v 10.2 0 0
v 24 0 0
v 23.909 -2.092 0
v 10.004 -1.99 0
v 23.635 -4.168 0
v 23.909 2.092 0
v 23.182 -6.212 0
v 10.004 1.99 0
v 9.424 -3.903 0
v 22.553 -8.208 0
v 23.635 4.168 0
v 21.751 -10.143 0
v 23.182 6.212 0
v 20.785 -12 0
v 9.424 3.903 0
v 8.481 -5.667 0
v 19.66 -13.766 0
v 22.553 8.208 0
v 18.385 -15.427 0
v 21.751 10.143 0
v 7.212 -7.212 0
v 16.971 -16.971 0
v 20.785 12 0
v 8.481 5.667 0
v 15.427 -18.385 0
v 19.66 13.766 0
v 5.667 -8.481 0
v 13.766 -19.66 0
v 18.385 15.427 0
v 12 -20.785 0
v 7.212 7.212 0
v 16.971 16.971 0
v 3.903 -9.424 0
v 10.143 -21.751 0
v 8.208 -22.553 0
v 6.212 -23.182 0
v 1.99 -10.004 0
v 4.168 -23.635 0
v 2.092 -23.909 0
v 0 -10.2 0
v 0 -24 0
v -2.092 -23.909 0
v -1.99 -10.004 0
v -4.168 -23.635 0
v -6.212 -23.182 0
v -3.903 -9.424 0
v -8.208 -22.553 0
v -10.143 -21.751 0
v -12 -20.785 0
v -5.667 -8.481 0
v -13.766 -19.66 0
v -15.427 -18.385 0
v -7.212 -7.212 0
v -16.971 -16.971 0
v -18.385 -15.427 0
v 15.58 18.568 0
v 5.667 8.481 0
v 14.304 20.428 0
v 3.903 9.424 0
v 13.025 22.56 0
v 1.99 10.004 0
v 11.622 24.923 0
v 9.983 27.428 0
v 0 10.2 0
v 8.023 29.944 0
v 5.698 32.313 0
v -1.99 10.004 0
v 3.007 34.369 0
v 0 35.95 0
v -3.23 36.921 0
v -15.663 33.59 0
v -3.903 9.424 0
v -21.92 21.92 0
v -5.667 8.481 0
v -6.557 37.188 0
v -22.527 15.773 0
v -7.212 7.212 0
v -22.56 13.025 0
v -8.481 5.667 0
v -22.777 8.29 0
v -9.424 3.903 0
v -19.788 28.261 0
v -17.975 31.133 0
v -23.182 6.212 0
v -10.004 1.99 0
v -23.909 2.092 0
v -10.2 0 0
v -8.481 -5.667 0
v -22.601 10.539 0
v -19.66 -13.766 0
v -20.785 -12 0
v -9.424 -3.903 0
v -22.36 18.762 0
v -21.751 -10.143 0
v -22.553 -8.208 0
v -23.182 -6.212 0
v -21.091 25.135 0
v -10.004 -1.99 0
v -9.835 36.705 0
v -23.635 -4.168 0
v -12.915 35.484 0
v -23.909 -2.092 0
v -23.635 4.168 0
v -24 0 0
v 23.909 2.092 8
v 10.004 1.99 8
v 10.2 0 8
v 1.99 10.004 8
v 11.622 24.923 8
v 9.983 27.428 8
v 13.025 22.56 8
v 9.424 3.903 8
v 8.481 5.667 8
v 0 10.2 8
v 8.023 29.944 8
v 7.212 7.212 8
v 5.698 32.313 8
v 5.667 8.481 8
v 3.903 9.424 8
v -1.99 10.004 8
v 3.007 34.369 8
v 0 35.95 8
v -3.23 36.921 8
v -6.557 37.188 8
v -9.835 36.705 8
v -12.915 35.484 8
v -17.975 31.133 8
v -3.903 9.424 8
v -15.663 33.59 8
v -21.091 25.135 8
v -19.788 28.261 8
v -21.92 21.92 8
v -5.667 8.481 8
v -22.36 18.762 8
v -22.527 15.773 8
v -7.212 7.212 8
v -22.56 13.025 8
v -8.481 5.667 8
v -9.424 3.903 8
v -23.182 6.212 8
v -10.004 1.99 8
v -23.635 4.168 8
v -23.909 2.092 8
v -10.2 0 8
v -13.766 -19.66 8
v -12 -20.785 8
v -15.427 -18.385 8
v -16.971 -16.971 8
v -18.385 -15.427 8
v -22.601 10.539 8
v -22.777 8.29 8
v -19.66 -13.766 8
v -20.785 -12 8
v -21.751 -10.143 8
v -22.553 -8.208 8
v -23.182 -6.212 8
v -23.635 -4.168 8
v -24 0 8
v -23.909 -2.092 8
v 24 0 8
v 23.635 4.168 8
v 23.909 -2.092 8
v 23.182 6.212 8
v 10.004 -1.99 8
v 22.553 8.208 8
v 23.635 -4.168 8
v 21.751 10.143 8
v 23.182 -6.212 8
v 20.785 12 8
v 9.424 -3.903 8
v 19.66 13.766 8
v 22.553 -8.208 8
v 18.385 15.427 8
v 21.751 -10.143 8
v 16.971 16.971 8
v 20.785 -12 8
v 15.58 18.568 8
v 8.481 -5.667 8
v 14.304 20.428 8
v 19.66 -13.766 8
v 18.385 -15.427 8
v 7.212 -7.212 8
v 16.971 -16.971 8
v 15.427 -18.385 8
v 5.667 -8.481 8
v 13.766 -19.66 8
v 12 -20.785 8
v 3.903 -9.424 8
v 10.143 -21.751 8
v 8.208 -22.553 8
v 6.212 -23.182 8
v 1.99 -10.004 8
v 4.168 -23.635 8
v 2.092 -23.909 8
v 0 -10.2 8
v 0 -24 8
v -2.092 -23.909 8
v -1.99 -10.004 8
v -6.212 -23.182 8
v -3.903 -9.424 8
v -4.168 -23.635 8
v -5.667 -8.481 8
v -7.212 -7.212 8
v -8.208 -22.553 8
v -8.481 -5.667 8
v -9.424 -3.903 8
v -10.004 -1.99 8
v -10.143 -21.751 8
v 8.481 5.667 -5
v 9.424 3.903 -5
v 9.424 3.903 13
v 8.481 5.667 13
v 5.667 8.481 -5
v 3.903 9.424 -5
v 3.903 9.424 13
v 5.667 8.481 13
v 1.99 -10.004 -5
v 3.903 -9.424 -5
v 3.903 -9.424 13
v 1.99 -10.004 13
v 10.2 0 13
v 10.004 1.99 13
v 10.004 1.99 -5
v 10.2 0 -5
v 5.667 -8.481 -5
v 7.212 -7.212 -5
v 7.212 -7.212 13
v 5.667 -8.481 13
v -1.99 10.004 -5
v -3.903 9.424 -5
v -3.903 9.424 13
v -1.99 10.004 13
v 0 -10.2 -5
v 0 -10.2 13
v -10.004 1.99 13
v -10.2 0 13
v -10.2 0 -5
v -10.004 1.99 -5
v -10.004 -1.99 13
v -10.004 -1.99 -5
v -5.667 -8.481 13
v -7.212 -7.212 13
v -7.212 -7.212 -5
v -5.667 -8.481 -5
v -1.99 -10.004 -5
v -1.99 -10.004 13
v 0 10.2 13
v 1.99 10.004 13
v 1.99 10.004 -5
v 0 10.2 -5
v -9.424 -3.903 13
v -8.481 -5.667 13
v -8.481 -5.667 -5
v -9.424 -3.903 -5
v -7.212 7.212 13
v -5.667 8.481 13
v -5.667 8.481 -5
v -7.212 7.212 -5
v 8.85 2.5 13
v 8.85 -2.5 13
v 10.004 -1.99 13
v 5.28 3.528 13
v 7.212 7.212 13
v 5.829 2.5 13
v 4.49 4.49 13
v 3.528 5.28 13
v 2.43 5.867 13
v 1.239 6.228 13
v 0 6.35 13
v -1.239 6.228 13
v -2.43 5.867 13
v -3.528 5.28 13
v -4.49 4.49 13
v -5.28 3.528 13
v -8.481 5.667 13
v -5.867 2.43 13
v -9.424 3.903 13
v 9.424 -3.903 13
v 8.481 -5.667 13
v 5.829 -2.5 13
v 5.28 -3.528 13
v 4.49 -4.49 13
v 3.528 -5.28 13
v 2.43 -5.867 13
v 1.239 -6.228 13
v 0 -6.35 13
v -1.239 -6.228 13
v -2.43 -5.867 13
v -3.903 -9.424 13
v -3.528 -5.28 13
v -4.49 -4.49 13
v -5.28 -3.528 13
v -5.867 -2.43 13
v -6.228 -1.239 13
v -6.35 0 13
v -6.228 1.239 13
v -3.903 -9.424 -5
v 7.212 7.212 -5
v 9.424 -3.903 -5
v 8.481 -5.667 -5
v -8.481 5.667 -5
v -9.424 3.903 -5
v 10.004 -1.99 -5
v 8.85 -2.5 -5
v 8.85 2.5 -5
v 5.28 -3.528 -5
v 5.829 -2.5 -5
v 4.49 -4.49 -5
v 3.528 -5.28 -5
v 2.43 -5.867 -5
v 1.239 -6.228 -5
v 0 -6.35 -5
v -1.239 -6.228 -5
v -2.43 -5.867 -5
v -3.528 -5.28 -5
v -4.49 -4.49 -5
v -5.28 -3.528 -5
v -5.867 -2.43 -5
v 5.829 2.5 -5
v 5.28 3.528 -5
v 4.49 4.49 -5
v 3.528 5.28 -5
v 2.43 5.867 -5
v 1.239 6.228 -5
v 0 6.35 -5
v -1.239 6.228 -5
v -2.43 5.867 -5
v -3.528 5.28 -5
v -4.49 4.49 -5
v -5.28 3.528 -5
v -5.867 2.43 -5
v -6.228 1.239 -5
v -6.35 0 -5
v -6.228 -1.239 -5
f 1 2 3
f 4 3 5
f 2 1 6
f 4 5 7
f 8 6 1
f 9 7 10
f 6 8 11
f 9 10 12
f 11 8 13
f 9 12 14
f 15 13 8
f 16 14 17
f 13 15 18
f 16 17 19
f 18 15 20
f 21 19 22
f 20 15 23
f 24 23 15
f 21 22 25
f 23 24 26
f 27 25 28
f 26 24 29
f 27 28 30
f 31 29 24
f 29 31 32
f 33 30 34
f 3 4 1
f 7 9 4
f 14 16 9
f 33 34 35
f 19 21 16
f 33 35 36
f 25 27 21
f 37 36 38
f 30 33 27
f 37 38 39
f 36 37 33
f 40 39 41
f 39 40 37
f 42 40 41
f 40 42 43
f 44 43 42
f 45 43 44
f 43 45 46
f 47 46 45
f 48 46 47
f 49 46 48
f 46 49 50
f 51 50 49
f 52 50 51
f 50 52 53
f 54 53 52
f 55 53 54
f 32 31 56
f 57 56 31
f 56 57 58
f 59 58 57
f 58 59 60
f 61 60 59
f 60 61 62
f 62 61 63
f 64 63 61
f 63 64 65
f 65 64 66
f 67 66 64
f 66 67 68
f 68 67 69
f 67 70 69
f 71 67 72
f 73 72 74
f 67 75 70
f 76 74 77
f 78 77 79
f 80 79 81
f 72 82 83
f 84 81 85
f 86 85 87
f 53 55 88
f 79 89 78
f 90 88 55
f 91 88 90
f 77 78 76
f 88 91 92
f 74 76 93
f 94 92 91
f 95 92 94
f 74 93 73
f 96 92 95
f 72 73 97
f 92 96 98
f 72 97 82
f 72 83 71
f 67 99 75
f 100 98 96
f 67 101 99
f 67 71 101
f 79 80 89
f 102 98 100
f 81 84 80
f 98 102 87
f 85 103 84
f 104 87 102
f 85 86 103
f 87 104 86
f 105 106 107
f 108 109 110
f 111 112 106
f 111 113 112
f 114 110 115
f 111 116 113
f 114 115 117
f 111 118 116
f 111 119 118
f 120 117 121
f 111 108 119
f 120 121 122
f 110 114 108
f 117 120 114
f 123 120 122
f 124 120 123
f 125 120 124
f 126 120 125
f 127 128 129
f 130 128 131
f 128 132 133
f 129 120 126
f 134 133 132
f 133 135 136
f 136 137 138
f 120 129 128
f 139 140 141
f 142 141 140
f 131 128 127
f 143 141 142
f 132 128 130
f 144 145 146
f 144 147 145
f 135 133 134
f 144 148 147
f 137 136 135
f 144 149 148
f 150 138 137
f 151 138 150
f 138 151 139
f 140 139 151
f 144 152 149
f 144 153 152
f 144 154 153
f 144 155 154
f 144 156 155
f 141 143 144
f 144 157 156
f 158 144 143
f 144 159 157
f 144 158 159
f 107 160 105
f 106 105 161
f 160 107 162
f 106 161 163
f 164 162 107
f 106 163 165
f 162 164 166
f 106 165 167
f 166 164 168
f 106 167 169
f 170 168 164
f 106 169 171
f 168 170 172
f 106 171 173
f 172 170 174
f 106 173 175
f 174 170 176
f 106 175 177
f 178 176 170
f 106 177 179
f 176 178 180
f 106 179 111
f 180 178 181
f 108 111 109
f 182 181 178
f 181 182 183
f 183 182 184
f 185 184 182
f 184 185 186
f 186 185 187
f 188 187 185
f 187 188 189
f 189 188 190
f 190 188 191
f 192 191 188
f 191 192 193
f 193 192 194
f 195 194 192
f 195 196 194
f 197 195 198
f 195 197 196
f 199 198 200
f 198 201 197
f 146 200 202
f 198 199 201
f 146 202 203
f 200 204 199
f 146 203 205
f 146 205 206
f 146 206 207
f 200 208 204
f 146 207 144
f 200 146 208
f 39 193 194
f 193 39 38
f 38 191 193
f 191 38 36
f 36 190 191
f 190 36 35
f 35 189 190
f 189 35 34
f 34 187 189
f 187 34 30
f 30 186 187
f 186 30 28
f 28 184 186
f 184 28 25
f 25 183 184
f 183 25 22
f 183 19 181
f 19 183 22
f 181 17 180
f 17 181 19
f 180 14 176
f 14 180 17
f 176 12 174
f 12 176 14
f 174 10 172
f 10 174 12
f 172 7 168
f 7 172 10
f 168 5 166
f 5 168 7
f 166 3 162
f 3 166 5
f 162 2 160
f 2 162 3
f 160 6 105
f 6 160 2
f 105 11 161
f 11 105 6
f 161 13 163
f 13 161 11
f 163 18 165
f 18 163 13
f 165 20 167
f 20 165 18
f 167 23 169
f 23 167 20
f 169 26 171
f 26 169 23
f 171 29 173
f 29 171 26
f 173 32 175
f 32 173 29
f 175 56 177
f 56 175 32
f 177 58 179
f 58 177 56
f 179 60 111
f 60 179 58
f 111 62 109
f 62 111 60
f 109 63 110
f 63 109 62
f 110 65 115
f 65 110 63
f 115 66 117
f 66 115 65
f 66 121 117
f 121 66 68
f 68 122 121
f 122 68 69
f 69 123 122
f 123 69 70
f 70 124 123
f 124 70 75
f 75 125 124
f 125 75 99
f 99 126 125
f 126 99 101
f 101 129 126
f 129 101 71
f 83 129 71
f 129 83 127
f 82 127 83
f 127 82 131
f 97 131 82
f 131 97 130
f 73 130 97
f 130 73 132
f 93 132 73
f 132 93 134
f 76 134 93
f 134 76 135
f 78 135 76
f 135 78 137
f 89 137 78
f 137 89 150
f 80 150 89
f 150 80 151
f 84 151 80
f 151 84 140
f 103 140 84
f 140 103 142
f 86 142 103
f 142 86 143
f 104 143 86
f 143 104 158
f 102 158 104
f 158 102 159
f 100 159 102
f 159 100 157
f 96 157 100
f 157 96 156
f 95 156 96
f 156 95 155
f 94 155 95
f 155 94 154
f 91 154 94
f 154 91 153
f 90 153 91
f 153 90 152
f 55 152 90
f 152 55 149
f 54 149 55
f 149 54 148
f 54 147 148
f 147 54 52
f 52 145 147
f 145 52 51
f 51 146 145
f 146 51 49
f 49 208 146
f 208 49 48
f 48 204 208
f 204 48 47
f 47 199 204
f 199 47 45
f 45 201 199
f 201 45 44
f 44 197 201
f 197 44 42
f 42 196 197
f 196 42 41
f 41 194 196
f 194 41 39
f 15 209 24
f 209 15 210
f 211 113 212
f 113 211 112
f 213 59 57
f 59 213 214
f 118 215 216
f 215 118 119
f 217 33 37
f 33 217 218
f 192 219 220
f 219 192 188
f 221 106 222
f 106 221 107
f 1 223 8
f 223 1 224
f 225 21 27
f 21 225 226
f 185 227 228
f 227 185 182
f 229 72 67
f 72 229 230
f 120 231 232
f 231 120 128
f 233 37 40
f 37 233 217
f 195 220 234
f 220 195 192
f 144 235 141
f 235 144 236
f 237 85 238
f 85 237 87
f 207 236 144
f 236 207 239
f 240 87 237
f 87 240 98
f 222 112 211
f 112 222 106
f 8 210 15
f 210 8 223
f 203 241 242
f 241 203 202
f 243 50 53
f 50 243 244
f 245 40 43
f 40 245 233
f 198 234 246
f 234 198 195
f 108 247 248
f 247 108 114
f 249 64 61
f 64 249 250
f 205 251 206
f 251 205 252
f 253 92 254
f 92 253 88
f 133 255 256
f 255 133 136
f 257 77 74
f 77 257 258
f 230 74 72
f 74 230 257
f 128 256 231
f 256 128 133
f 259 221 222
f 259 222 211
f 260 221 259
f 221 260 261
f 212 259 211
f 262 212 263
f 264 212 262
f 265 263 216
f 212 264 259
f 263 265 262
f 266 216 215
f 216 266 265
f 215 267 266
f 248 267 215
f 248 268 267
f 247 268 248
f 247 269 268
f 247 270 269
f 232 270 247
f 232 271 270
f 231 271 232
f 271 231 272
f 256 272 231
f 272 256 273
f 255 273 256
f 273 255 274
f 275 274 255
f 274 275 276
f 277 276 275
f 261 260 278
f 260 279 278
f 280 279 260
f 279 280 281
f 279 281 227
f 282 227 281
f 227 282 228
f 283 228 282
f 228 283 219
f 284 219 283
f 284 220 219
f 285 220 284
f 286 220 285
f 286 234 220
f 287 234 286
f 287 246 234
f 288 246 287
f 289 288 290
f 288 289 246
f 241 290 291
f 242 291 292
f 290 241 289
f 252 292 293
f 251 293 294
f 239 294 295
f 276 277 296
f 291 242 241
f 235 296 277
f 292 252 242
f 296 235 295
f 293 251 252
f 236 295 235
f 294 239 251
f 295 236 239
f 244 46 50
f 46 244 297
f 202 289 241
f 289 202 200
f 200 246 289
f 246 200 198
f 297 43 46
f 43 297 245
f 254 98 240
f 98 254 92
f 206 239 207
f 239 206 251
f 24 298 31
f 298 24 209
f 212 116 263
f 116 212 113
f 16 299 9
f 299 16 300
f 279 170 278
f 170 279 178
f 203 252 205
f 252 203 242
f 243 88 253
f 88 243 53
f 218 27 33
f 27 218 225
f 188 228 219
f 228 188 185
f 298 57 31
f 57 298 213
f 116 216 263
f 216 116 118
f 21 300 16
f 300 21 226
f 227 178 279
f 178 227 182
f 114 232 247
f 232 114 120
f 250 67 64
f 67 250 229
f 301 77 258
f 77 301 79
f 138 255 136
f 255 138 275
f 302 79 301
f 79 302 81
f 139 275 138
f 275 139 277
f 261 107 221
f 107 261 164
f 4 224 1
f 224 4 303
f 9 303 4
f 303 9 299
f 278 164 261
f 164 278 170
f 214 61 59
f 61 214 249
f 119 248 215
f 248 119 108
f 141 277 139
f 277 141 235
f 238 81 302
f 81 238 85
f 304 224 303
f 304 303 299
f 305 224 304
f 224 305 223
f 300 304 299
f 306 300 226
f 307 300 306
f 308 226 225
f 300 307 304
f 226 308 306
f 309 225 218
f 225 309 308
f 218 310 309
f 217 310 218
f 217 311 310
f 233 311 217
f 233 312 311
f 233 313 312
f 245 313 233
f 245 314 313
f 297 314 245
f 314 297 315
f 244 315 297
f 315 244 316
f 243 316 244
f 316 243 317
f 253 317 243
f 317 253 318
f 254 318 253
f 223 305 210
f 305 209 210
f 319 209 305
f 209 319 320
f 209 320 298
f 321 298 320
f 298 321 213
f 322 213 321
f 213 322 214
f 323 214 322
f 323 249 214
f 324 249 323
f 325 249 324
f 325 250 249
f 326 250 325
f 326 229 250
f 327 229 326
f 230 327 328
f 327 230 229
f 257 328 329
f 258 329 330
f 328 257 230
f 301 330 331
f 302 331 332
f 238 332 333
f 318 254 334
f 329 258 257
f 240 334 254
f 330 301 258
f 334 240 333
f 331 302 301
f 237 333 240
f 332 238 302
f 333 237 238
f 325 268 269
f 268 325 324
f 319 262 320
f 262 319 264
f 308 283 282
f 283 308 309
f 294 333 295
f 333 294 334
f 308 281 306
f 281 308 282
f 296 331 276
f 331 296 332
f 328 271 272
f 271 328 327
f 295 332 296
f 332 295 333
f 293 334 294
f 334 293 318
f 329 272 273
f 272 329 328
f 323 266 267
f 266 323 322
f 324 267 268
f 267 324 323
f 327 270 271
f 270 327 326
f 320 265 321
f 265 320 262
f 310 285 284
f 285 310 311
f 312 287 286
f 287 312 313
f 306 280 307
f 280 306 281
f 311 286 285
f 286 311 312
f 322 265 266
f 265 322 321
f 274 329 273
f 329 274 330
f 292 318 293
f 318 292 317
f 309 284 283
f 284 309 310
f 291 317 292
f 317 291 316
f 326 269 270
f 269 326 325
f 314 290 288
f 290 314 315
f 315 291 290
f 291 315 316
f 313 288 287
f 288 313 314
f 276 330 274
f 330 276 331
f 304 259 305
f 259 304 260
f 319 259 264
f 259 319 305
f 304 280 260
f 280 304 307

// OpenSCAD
$fn = 32;

// ----------------------------------------------------------------------
// Cam: base radius 24 mm with a 14 mm lift over 120 degrees
// ----------------------------------------------------------------------

// --- parameters (mm) ---
base_r = 24;              // base radius
lift = 14;                // lift height above the base radius
lift_span = 120;          // angular width of the lift
lift_start = 45;          // angle where the lift starts
cam_t = 8;                // cam plate thickness
hub_d = 20.4;             // hub diameter
hub_h = 18;               // hub height
bore_d = 12.7;            // bore
key_w = 5;                // keyway width
key_depth = 1.85;         // keyway depth

cam_profile = [[24, 0], [23.909, 2.092], [23.635, 4.168], [23.182, 6.212], [22.553, 8.208], [21.751, 10.143], [20.785, 12], [19.66, 13.766], [18.385, 15.427], [16.971, 16.971], [15.58, 18.568], [14.304, 20.428], [13.025, 22.56], [11.622, 24.923], [9.983, 27.428], [8.023, 29.944], [5.698, 32.313], [3.007, 34.369], [0, 35.95], [-3.23, 36.921], [-6.557, 37.188], [-9.835, 36.705], [-12.915, 35.484], [-15.663, 33.59], [-17.975, 31.133], [-19.788, 28.261], [-21.091, 25.135], [-21.92, 21.92], [-22.36, 18.762], [-22.527, 15.773], [-22.56, 13.025], [-22.601, 10.539], [-22.777, 8.29], [-23.182, 6.212], [-23.635, 4.168], [-23.909, 2.092], [-24, 0], [-23.909, -2.092], [-23.635, -4.168], [-23.182, -6.212], [-22.553, -8.208], [-21.751, -10.143], [-20.785, -12], [-19.66, -13.766], [-18.385, -15.427], [-16.971, -16.971], [-15.427, -18.385], [-13.766, -19.66], [-12, -20.785], [-10.143, -21.751], [-8.208, -22.553], [-6.212, -23.182], [-4.168, -23.635], [-2.092, -23.909], [0, -24], [2.092, -23.909], [4.168, -23.635], [6.212, -23.182], [8.208, -22.553], [10.143, -21.751], [12, -20.785], [13.766, -19.66], [15.427, -18.385], [16.971, -16.971], [18.385, -15.427], [19.66, -13.766], [20.785, -12], [21.751, -10.143], [22.553, -8.208], [23.182, -6.212], [23.635, -4.168], [23.909, -2.092]];

difference() {
  union() {
    linear_extrude(height = cam_t) polygon(cam_profile);
    /* hub, proud of the cam plate on both sides */
    translate([0, 0, -5]) cylinder(h = hub_h, d = hub_d);
  }
  /* bore through the hub, 2.5 mm clear on both faces */
  translate([0, 0, -7.5]) cylinder(h = hub_h + 5, d = bore_d);
  /* keyway, milled through the whole hub */
  translate([4.5, -2.5, -7.5]) cube([4.35, 5, 23]);
}
